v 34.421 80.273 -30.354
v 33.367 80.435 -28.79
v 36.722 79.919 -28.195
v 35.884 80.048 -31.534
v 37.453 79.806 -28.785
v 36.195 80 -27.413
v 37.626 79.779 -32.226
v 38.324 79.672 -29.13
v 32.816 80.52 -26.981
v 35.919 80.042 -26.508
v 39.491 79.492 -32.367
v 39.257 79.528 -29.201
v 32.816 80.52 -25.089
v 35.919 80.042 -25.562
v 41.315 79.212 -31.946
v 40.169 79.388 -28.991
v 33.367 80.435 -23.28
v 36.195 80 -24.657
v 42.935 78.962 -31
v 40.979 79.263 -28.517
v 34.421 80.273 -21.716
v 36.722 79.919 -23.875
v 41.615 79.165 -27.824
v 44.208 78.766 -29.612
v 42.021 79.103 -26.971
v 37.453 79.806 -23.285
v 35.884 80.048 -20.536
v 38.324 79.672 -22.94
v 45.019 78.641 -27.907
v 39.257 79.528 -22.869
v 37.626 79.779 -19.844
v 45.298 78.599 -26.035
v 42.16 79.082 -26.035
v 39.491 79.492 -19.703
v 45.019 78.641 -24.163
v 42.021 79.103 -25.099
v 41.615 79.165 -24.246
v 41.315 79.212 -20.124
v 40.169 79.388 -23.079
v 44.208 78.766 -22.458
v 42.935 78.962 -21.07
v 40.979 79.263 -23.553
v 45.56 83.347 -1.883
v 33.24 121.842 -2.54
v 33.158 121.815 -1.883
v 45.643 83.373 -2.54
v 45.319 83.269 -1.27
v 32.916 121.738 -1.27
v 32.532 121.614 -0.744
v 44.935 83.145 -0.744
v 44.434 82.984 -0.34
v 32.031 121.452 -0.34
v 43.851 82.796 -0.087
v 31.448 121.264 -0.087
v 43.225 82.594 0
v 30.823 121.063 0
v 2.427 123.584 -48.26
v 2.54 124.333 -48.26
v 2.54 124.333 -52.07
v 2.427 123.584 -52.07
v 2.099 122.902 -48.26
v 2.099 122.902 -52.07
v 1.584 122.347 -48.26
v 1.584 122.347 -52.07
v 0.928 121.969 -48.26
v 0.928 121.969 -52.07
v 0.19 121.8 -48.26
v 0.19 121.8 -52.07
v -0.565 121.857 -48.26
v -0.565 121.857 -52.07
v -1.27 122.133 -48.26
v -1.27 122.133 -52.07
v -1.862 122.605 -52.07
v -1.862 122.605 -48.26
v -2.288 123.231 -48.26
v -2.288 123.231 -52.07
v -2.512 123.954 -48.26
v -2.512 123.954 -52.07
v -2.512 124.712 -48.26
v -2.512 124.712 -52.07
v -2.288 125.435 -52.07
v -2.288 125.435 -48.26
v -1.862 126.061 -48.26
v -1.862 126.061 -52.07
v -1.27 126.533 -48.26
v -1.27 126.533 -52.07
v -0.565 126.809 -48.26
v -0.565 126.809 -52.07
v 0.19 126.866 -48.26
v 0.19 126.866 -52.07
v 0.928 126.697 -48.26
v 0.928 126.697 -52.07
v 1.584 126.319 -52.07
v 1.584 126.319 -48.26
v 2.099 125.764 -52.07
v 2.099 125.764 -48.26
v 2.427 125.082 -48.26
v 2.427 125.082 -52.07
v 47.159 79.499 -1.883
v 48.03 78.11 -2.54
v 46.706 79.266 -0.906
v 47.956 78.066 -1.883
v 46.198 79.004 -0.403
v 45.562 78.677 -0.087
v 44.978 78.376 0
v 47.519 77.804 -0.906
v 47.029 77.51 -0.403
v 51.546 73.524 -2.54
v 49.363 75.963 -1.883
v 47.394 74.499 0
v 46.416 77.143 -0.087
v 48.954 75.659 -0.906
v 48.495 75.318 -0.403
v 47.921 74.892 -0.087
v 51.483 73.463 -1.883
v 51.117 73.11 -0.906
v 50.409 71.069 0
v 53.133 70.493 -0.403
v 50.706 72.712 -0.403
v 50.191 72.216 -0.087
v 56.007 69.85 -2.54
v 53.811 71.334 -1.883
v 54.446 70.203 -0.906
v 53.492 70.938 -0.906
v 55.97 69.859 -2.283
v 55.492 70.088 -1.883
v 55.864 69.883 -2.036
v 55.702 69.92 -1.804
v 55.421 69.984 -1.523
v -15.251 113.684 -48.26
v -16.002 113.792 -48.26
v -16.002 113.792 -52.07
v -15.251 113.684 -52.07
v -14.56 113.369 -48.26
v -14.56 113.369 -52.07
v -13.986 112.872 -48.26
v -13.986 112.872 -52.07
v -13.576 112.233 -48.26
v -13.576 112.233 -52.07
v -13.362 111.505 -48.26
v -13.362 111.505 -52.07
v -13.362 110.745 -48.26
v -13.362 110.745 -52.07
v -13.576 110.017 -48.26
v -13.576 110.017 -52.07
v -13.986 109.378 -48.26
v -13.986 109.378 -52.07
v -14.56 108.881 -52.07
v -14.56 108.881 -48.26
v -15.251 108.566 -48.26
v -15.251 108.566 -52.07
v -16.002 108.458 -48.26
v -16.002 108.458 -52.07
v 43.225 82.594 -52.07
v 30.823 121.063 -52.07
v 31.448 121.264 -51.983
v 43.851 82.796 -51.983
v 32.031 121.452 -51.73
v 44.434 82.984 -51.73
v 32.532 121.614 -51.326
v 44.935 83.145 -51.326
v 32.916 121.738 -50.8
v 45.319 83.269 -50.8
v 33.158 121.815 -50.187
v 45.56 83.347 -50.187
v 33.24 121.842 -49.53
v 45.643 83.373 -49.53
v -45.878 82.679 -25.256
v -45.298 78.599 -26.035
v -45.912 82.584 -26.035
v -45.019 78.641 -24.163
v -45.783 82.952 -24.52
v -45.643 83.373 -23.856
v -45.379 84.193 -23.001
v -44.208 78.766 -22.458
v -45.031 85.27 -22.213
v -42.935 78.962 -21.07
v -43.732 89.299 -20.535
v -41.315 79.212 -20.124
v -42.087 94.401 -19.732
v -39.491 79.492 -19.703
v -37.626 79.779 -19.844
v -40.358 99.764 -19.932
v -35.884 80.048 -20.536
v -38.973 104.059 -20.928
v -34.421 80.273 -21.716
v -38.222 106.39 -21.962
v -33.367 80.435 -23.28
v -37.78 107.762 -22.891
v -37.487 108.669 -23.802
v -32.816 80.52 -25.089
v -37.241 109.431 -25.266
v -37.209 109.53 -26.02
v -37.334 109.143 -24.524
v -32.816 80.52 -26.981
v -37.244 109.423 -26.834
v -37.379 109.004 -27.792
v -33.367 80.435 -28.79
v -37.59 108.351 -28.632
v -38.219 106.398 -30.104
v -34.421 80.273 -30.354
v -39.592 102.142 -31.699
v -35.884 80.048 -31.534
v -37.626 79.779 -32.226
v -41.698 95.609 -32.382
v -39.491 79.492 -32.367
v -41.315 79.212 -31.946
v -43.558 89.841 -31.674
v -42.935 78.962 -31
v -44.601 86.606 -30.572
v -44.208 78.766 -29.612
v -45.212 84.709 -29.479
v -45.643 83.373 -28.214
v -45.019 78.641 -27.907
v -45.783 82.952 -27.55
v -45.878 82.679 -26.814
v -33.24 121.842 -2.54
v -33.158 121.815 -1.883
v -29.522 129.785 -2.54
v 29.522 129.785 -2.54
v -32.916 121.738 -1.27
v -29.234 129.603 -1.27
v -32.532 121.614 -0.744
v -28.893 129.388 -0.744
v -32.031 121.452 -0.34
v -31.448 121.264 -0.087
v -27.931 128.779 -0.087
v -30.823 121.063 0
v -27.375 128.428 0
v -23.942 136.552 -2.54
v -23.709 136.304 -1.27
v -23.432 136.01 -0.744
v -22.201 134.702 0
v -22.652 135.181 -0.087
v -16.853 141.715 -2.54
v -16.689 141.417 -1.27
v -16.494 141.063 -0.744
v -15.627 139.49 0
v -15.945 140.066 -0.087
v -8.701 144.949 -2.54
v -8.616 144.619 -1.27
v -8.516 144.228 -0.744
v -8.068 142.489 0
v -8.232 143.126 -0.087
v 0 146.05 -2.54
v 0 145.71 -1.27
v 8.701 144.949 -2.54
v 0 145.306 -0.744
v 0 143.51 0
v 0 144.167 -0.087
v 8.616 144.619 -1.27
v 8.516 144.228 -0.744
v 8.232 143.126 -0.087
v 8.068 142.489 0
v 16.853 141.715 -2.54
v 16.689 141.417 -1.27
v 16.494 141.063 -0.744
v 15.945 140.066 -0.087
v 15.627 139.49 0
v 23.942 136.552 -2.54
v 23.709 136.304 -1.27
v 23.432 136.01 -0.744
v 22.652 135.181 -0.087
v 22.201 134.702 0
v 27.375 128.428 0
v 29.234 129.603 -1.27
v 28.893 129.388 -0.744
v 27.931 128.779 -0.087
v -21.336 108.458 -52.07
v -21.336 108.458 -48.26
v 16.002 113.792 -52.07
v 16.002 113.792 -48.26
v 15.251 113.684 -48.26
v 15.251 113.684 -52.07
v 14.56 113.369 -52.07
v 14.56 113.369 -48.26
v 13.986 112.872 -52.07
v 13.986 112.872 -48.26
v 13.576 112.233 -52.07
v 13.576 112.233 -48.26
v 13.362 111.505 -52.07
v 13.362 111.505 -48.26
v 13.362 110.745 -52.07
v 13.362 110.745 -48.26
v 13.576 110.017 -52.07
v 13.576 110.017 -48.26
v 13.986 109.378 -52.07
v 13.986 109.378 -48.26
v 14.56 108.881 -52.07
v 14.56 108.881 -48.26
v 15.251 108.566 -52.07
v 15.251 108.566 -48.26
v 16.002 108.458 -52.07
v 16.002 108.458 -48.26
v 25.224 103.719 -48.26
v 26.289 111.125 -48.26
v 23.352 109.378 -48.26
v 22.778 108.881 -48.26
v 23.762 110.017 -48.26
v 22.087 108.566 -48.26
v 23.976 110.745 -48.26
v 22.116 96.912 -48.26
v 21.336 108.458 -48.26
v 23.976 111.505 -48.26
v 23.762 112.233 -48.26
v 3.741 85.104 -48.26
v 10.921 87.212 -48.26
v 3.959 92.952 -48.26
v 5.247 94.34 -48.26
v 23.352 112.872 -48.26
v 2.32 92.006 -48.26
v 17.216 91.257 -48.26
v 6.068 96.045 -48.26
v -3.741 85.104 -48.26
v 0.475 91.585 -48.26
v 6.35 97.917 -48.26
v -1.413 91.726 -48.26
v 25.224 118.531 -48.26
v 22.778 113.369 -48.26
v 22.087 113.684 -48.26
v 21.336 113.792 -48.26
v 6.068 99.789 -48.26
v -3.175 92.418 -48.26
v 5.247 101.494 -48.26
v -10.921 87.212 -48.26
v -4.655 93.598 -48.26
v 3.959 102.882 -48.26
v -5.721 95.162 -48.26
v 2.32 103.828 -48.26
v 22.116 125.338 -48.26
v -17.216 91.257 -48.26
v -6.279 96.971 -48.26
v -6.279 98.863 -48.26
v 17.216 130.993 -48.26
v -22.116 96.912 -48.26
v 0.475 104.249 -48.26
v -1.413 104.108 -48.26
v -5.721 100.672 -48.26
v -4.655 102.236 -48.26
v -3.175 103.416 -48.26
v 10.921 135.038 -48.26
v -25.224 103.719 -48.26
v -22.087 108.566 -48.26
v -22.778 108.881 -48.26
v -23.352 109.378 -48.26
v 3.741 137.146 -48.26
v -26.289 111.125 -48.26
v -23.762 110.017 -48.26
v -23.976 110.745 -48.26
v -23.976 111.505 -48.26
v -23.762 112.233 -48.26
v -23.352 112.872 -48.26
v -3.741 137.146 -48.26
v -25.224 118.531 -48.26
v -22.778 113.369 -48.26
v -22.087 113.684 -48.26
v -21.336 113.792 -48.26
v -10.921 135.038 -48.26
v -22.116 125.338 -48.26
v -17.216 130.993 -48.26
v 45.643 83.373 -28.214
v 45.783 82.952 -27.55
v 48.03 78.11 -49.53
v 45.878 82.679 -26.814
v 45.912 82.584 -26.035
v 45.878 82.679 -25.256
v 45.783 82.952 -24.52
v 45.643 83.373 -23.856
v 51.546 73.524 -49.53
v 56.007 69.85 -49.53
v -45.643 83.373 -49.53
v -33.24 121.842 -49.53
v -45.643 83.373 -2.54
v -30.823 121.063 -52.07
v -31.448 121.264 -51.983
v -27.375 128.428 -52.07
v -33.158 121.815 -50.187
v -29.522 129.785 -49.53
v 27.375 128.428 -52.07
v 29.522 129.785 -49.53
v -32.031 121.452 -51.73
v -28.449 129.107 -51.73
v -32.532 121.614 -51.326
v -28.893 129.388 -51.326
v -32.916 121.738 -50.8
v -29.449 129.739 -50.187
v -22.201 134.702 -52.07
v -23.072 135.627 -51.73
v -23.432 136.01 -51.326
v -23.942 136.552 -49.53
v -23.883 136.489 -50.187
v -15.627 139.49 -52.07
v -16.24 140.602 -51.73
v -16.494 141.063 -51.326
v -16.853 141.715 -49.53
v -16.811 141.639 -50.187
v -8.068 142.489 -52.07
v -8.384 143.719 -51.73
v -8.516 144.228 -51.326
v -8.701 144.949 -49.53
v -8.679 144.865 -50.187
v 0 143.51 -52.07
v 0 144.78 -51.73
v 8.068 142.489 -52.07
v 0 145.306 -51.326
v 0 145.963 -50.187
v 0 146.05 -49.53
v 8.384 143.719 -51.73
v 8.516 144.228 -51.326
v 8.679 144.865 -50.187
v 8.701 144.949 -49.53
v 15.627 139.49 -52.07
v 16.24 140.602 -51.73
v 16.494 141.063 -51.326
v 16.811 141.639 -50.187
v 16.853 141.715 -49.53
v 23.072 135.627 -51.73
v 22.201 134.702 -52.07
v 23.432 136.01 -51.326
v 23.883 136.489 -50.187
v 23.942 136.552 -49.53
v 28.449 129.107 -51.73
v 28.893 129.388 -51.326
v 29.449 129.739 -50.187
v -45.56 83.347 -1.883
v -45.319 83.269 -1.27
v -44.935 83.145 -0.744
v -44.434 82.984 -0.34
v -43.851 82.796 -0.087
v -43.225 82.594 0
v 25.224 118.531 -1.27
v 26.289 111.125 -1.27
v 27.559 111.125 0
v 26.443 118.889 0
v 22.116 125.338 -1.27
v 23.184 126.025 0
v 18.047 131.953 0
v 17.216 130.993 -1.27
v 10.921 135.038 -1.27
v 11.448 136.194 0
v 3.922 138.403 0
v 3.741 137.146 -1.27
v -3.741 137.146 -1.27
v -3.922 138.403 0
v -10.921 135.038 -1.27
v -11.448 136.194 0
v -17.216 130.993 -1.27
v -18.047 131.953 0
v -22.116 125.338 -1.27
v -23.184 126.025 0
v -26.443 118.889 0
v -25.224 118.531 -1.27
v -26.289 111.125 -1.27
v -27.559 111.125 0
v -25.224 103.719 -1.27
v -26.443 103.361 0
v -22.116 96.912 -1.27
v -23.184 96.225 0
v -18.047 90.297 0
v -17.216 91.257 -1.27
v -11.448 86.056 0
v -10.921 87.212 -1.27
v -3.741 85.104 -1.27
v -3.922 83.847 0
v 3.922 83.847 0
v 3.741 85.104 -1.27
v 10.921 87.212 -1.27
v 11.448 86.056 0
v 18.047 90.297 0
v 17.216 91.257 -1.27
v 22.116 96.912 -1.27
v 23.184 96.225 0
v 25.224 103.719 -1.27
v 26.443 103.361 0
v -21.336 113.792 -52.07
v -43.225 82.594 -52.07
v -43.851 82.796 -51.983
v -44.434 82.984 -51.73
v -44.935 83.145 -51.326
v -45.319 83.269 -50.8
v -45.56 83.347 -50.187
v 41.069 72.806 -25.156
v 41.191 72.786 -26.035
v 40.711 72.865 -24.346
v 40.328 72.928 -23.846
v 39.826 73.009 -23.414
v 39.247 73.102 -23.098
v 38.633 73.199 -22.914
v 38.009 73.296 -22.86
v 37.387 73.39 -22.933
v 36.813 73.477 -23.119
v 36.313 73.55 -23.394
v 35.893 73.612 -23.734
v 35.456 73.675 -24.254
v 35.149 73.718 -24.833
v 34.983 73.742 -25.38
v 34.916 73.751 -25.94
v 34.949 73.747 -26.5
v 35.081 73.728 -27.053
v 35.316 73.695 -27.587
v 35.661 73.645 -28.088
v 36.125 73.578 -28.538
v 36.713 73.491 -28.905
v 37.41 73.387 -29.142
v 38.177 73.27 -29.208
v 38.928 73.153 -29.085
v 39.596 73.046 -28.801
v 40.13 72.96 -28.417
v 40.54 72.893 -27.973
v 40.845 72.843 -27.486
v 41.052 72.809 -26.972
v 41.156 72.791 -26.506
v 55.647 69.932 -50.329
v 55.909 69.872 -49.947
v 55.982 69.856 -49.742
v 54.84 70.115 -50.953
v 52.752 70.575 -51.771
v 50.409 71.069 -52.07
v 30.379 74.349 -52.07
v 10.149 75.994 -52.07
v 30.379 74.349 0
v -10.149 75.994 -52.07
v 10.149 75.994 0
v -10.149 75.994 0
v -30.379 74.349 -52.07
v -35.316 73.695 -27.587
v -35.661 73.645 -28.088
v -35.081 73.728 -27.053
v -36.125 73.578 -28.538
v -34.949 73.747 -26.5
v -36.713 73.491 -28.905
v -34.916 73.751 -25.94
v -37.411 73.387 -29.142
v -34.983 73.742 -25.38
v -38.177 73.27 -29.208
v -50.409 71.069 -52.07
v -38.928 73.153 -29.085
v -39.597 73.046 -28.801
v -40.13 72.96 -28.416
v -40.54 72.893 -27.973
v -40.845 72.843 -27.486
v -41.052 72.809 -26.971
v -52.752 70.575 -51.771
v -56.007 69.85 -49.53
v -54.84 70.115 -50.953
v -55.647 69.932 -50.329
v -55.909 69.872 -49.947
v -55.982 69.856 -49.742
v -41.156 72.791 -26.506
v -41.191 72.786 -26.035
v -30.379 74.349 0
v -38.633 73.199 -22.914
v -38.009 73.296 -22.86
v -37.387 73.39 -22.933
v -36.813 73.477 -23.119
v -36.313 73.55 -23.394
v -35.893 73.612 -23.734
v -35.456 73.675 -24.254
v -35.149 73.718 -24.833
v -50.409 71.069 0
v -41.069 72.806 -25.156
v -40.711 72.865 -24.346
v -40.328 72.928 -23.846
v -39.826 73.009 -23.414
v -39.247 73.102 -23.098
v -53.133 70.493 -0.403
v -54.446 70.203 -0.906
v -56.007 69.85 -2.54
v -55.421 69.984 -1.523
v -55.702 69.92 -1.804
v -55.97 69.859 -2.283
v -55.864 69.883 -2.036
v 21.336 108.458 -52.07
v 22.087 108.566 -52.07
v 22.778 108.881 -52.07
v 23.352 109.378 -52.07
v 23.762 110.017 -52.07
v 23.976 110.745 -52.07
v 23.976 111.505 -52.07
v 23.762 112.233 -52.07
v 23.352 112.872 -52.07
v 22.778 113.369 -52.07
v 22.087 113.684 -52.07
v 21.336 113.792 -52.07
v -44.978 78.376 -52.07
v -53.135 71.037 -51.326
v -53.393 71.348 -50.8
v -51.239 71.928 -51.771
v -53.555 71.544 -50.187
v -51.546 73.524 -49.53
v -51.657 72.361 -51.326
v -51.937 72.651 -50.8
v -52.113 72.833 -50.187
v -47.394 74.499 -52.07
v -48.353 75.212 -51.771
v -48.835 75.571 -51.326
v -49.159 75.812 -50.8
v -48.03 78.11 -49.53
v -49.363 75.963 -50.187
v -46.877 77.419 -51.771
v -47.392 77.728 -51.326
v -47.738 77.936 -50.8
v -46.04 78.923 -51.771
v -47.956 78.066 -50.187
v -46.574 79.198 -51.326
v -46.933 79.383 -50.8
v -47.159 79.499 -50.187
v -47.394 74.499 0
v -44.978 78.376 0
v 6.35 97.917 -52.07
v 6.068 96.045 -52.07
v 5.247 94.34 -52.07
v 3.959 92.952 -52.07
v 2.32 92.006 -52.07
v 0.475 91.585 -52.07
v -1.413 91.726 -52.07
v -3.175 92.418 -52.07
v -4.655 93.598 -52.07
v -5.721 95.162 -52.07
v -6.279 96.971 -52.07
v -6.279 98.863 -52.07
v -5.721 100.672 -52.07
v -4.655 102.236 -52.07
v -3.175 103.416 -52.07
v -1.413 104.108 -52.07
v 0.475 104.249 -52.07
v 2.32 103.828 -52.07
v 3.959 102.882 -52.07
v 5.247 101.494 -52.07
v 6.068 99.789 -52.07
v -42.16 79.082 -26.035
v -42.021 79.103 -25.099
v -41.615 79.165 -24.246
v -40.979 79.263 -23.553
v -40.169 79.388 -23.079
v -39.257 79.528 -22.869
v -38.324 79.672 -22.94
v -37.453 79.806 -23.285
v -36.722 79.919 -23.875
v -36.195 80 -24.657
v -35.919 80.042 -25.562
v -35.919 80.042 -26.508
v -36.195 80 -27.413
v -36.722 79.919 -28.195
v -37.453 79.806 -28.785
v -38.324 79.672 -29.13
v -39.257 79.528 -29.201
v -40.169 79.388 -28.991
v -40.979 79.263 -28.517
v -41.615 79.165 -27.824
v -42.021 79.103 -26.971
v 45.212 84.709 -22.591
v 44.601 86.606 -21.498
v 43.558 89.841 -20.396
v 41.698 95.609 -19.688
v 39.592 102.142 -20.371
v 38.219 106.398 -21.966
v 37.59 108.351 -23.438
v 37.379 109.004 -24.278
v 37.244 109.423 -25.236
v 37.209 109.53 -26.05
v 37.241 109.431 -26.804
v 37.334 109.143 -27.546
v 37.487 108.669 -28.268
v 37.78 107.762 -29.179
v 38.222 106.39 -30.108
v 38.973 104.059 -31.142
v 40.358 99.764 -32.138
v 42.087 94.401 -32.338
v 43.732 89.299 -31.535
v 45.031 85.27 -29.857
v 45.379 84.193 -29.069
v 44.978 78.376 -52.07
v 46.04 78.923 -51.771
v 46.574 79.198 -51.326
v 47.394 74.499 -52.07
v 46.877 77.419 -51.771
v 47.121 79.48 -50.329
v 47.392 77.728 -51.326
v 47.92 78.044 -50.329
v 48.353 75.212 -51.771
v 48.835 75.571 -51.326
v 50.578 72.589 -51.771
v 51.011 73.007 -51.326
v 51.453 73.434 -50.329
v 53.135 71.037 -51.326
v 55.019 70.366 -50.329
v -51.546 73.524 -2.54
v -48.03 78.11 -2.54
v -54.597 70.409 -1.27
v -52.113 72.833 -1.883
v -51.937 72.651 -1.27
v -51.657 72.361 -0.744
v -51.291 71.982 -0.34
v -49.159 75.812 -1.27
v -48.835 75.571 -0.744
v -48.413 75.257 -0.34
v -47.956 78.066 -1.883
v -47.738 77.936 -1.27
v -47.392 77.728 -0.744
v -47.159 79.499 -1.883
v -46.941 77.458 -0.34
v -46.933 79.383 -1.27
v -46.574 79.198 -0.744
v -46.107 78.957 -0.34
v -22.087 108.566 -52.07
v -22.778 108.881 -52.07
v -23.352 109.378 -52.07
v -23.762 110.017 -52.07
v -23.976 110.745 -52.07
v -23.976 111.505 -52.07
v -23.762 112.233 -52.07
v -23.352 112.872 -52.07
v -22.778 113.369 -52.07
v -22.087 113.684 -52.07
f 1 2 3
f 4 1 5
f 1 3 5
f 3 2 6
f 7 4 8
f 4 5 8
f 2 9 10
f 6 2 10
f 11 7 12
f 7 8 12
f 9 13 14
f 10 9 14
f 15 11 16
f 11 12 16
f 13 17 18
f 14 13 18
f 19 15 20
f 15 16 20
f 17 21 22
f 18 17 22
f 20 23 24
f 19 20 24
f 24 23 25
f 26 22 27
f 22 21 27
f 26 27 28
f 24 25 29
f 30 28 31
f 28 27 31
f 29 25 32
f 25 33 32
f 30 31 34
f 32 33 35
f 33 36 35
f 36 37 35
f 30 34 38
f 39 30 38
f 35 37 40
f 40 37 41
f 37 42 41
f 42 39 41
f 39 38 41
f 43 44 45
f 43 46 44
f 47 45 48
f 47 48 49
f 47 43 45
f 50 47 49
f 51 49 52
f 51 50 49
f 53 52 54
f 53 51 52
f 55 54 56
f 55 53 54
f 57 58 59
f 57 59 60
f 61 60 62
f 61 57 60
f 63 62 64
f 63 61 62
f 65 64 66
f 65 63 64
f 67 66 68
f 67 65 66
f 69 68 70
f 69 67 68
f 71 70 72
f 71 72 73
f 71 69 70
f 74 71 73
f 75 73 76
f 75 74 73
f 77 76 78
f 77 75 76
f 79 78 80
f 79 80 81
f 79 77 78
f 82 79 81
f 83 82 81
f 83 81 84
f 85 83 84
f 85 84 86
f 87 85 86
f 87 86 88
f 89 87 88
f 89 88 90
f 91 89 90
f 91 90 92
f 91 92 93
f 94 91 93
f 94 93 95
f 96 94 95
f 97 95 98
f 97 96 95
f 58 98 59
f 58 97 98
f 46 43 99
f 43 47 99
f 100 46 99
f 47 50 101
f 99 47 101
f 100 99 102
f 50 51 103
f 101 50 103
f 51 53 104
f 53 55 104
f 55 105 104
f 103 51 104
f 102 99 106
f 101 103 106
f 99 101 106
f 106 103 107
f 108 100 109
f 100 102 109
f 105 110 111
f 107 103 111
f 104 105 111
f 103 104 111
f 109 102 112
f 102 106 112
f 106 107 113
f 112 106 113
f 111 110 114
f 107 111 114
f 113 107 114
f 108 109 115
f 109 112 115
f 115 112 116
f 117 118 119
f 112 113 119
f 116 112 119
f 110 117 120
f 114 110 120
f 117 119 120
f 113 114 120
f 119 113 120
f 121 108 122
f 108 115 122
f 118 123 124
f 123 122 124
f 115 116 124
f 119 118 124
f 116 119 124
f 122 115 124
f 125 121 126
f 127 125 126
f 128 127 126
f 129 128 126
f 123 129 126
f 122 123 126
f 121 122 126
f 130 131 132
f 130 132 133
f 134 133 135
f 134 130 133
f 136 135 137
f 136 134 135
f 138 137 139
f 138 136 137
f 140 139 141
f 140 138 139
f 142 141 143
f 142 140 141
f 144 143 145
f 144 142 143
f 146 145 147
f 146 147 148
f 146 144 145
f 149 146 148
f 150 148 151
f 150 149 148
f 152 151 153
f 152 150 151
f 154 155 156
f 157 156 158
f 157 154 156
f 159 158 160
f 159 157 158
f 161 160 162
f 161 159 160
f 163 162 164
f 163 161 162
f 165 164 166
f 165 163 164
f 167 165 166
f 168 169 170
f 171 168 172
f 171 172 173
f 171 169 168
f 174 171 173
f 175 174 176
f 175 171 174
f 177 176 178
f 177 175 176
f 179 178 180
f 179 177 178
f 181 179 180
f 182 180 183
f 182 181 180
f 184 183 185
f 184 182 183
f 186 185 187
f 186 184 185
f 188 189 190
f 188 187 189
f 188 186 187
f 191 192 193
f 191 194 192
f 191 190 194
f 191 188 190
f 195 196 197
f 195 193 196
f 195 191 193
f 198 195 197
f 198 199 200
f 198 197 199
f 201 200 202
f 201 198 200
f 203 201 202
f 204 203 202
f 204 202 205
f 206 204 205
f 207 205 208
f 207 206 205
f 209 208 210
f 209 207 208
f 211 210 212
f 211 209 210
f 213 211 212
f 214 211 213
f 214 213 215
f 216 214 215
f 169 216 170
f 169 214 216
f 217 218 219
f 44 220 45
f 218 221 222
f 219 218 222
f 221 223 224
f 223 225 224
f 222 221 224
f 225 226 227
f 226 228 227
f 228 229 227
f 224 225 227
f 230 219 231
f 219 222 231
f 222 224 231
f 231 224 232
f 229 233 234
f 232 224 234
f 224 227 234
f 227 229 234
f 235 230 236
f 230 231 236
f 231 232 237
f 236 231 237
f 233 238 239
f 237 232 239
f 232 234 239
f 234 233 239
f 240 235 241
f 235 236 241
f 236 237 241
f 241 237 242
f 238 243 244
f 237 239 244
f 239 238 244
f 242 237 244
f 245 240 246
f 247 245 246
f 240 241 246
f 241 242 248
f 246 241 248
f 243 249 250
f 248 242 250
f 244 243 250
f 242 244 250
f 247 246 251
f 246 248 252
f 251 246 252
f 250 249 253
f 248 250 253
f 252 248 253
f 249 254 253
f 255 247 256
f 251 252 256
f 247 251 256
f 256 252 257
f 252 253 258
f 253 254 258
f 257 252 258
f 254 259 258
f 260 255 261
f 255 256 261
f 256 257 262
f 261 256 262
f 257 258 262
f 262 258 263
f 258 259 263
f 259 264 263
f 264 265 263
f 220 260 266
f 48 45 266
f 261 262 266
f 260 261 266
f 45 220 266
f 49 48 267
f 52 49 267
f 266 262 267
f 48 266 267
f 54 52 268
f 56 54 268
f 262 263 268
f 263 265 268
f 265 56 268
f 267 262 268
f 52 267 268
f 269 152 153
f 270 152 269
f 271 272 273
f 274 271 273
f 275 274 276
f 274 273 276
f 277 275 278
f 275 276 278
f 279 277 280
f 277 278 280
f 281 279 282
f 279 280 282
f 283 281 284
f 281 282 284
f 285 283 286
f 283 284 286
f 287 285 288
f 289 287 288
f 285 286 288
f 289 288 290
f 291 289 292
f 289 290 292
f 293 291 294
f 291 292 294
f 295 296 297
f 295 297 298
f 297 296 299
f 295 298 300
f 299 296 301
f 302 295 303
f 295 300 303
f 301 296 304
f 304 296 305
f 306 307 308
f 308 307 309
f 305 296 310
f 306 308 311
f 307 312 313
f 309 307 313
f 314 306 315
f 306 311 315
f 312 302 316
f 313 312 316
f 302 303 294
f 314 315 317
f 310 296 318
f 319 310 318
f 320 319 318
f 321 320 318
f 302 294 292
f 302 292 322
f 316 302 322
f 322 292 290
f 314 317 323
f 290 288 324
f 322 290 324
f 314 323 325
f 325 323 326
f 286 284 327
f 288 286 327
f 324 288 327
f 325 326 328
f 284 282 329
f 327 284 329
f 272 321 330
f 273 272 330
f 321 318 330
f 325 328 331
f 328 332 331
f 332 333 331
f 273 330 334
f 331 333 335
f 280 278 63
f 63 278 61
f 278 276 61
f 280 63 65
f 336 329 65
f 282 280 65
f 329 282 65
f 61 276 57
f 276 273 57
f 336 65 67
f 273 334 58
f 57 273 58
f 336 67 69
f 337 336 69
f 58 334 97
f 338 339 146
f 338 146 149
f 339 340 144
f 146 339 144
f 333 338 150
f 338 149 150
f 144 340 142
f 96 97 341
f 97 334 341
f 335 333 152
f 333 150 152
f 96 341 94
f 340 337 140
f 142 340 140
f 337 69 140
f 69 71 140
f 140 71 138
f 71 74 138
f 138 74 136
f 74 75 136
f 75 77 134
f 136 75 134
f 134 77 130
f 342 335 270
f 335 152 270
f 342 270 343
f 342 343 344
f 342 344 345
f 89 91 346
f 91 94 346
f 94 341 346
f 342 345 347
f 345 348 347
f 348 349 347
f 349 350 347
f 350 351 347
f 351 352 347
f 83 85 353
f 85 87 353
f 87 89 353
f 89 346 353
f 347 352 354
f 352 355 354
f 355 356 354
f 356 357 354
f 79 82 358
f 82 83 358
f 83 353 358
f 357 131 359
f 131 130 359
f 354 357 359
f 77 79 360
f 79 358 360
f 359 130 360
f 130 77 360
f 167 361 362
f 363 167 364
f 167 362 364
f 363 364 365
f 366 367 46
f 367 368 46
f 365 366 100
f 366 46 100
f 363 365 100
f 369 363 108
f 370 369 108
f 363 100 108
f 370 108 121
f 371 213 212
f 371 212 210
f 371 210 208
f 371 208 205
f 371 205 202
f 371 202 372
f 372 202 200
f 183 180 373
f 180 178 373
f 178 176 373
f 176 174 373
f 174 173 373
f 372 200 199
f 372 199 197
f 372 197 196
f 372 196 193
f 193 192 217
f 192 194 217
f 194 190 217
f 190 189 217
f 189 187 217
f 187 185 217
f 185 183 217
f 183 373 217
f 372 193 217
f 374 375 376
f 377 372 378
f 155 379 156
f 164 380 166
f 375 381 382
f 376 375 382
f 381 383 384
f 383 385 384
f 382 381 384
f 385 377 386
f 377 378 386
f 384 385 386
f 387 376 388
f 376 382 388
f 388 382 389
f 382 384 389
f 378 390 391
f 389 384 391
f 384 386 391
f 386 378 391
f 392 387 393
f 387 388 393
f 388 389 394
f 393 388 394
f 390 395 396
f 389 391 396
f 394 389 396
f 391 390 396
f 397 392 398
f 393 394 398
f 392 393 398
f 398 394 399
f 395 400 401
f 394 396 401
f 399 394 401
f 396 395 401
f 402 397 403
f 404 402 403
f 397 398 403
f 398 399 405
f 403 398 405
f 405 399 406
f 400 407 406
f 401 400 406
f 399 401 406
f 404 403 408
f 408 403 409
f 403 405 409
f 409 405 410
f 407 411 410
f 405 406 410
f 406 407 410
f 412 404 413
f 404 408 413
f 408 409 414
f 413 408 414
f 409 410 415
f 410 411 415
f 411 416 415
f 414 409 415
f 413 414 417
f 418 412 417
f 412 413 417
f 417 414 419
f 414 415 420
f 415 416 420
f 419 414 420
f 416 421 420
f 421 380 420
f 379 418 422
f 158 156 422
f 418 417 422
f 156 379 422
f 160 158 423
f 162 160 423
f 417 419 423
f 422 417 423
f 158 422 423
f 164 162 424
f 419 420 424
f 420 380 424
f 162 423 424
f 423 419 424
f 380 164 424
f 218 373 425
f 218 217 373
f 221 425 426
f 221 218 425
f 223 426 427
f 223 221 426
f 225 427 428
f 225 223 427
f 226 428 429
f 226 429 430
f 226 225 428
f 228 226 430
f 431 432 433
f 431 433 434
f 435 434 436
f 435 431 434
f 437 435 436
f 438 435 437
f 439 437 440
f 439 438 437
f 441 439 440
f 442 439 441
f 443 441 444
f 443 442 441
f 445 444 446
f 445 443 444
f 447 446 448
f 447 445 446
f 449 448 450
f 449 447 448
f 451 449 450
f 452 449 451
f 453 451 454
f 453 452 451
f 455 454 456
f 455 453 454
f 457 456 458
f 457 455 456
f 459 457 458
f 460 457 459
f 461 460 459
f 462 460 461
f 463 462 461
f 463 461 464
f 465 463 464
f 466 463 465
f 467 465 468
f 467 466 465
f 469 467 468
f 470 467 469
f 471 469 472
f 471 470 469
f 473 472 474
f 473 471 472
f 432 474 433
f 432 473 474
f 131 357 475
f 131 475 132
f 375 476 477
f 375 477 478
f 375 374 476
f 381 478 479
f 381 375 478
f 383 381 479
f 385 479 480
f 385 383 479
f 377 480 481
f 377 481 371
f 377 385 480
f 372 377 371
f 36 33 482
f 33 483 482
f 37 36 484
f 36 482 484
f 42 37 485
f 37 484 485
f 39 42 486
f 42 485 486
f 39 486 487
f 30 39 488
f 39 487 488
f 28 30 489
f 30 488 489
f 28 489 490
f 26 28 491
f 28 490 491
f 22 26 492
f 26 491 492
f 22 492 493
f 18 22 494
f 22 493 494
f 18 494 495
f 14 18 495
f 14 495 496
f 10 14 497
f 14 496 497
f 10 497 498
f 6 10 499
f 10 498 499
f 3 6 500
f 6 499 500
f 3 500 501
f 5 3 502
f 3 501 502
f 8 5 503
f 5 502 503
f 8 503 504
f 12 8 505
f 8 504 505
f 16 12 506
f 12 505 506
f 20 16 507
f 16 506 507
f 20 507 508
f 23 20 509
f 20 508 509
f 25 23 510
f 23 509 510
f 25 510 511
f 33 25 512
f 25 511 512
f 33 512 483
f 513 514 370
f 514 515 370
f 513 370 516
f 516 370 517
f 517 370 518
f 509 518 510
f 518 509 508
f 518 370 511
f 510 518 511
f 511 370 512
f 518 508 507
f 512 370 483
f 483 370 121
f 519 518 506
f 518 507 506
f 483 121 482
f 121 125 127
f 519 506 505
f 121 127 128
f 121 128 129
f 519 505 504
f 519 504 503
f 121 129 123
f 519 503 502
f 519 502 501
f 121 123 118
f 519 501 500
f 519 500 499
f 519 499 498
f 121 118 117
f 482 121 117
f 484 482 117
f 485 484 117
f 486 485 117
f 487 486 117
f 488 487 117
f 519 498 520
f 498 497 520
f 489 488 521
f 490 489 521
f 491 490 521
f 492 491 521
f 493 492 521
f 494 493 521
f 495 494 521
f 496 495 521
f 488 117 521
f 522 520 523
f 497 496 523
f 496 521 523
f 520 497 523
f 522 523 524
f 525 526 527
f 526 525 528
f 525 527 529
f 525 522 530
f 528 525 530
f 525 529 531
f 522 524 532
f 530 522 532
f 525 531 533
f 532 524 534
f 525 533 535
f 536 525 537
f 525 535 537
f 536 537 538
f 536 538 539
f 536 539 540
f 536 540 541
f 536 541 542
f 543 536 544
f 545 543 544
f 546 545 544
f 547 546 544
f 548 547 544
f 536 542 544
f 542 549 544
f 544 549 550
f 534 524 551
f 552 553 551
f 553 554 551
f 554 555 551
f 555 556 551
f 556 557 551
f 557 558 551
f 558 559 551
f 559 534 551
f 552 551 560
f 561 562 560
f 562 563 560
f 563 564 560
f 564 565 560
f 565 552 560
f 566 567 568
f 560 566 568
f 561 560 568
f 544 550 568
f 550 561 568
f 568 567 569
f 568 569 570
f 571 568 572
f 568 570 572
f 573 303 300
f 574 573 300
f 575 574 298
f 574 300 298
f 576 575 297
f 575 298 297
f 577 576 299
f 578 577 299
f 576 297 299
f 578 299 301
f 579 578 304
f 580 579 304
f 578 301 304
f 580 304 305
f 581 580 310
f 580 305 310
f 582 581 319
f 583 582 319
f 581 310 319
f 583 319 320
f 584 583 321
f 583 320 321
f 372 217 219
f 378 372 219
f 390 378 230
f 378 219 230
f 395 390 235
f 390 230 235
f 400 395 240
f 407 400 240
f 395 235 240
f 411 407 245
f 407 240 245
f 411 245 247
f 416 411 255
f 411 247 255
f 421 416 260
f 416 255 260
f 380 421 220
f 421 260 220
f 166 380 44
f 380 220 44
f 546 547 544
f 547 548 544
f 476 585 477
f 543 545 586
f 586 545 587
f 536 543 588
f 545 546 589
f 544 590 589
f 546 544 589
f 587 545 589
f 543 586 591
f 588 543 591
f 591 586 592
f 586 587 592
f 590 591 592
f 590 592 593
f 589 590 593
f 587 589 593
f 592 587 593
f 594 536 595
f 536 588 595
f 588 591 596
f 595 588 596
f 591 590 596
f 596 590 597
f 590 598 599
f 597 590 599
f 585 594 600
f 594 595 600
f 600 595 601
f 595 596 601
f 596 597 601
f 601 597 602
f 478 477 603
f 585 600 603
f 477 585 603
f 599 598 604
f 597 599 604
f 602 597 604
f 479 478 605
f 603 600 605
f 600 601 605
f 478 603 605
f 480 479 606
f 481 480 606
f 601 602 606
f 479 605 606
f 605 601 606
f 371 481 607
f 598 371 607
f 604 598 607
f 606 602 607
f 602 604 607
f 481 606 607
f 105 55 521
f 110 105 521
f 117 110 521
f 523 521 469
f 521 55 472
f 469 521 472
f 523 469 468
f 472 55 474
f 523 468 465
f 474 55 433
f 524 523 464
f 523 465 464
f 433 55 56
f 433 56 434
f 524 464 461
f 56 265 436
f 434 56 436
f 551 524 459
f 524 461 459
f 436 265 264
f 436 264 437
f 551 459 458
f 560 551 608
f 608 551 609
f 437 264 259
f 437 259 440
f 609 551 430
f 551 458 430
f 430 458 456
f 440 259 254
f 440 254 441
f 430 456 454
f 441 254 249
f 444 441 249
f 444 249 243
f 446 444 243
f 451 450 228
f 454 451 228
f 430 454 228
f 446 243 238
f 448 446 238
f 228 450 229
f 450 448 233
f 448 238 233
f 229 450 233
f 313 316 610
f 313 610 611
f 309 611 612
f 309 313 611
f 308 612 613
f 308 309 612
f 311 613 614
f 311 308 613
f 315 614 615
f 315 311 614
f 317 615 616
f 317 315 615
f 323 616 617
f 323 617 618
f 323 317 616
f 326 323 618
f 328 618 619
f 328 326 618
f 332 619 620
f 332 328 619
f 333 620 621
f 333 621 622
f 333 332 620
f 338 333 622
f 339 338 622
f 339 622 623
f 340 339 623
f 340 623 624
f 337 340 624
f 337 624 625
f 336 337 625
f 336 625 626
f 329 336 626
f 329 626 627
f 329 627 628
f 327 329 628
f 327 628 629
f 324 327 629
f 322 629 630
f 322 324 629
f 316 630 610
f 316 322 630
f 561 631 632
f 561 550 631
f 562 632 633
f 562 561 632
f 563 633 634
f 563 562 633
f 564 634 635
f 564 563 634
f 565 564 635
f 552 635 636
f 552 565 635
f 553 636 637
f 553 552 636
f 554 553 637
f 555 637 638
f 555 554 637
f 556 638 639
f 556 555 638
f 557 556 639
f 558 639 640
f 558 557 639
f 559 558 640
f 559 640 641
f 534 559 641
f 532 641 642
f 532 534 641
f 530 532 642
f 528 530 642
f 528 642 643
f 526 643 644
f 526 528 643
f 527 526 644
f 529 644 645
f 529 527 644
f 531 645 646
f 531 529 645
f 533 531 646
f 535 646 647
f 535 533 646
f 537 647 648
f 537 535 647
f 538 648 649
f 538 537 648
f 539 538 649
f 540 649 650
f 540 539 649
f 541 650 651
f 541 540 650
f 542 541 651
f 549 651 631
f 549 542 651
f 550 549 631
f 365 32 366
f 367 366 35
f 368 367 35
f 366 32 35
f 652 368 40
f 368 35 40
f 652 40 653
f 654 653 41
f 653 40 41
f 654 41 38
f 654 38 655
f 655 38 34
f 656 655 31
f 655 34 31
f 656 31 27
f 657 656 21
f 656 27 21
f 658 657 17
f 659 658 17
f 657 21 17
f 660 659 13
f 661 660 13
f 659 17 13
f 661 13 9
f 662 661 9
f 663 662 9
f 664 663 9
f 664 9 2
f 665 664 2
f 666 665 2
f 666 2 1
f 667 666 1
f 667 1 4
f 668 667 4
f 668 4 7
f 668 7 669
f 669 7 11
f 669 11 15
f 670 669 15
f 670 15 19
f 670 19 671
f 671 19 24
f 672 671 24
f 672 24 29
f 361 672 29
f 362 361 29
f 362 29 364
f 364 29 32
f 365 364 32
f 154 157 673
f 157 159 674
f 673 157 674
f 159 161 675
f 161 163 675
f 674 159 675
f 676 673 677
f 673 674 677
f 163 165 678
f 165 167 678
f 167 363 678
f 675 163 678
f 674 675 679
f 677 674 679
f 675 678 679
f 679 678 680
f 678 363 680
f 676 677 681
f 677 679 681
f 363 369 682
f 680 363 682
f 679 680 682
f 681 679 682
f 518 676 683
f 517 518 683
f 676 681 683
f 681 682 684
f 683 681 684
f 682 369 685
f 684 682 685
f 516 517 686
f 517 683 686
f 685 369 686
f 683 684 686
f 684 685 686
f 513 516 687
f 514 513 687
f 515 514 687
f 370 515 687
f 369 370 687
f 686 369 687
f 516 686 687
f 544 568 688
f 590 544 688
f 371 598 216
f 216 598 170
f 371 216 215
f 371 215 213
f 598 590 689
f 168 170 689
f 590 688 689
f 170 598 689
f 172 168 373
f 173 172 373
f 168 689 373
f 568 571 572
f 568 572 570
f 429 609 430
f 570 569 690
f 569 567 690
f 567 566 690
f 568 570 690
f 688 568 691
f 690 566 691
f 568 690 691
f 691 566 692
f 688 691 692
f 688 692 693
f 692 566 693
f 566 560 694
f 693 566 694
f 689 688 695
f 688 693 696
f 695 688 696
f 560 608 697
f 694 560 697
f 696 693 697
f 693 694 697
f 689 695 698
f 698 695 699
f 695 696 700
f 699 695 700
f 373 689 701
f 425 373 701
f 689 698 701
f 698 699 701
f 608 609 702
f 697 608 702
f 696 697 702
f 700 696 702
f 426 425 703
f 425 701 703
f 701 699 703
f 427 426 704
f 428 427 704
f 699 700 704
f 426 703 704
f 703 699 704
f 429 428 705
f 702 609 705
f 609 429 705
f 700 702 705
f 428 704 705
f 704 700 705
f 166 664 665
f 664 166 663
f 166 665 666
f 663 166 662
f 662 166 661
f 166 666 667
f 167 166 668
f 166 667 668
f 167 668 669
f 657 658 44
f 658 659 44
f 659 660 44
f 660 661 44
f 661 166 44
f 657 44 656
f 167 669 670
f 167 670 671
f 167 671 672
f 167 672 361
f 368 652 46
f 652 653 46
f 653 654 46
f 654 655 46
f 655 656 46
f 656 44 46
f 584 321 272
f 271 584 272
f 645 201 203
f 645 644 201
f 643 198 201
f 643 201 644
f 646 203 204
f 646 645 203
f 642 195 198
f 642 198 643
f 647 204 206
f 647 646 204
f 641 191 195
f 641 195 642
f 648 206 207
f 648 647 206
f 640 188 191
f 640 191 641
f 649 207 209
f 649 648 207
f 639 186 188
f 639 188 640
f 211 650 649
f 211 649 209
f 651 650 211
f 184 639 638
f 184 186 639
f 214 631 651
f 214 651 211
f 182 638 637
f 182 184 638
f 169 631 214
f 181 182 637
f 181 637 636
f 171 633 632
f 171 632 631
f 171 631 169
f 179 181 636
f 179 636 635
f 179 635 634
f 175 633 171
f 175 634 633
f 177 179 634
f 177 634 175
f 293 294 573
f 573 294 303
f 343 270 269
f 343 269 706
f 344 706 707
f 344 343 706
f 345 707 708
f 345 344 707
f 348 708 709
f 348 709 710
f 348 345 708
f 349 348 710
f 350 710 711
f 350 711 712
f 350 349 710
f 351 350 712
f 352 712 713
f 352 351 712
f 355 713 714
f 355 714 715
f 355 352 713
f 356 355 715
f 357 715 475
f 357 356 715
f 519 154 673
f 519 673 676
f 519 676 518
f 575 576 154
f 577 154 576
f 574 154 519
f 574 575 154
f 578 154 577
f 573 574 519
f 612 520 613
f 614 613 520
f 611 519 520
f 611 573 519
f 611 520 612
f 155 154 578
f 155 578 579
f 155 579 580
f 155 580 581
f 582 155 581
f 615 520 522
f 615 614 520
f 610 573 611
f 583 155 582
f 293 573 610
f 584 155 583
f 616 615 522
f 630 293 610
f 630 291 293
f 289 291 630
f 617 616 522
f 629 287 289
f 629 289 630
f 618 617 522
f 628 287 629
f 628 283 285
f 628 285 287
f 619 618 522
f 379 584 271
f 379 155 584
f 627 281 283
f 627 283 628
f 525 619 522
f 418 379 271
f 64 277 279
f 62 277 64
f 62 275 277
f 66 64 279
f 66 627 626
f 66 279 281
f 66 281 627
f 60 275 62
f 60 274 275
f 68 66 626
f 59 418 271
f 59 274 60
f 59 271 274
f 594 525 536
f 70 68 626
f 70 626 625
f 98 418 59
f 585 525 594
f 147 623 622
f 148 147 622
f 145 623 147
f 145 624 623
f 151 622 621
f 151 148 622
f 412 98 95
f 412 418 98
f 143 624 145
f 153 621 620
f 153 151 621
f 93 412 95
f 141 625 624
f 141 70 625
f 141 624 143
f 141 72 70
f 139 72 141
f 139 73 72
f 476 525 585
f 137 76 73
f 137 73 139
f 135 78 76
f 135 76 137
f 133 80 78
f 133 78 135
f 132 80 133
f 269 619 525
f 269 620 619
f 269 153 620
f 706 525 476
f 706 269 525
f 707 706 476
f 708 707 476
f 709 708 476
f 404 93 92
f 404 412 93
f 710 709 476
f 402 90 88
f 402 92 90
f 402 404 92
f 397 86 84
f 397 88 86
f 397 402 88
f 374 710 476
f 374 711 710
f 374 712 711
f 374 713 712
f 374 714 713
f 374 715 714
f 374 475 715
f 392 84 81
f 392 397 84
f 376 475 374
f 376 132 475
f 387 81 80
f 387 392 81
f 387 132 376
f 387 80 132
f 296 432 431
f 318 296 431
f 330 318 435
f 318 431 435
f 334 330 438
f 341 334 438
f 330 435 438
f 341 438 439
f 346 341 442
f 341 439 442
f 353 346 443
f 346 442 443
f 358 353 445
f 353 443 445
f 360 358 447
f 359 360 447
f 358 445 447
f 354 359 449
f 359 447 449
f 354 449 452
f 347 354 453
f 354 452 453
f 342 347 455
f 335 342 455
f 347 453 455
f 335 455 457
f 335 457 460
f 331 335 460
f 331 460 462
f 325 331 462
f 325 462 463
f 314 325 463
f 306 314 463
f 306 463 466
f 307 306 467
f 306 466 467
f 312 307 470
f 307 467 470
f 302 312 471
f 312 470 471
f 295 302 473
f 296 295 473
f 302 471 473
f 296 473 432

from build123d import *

# Parameters (mm, degrees)
SKETCH1_R           = 26.289
BOSS_EXTRUDE1_DEPTH = 48.26
FILLET1_R           = 2.54
CHAMFER1_SIZE       = 1.27
SKETCH2_R           = 6.35
SKETCH2_R_2         = 2.54
BOSS_EXTRUDE2_DEPTH = 3.81
FILLET2_R           = 2.54
SKETCH4_R           = 3.175
CUT_EXTRUDE1_DEPTH  = 110.759820078
CUT_EXTRUDE2_START  = -6.35
SKETCH5_R           = 6.35
CUT_EXTRUDE2_DEPTH  = 104.409820078


with BuildPart() as part:
    # Sketch1 → Boss-Extrude1 (new body)
    with BuildSketch(Plane.XY):
        with BuildLine():
            Line((-45.642801894, 83.373274477), (-33.240070063, 121.841966324))
            ThreePointArc((-33.240070063, 121.841966324), (0, 146.05), (33.240070063, 121.841966324))
            Line((33.240070063, 121.841966324), (45.642801894, 83.373274477))
            ThreePointArc((45.642801894, 83.373274477), (49.65717276, 75.716693762), (56.007, 69.85))
            ThreePointArc((56.007, 69.85), (0, 76.2), (-56.007, 69.85))
            ThreePointArc((-56.007, 69.85), (-49.65717276, 75.716693762), (-45.642801894, 83.373274477))
        make_face()
        with Locations((0, 111.125)):
            Circle(SKETCH1_R, mode=Mode.SUBTRACT)
    extrude(amount=-BOSS_EXTRUDE1_DEPTH)

    # Fillet1
    fillet1_edges = [part.edges().sort_by_distance(p)[0] for p in [
        (-49.65717276, 75.716693762, 0),
        (-39.441435979, 102.6076204, 0),
        (0, 146.05, 0),
        (39.441435979, 102.6076204, 0),
        (49.65717276, 75.716693762, 0),
    ]]
    fillet(fillet1_edges, radius=FILLET1_R)

    # Chamfer1
    chamfer1_edges = [part.edges().sort_by_distance(p)[0] for p in [
        (-26.289, 111.125, 0),
    ]]
    chamfer(chamfer1_edges, length=CHAMFER1_SIZE)

    # Sketch2 → Boss-Extrude2 (add)
    with BuildSketch(Plane(origin=(0, 0, -48.26), x_dir=(-1, 0, 0), z_dir=(0, 0, -1))):
        with BuildLine():
            Line((45.642801894, 83.373274477), (33.240070063, 121.841966324))
            ThreePointArc((33.240070063, 121.841966324), (0, 146.05), (-33.240070063, 121.841966324))
            Line((-33.240070063, 121.841966324), (-45.642801894, 83.373274477))
            ThreePointArc((-45.642801894, 83.373274477), (-49.65717276, 75.716693762), (-56.007, 69.85))
            ThreePointArc((-56.007, 69.85), (0, 76.2), (56.007, 69.85))
            ThreePointArc((56.007, 69.85), (49.65717276, 75.716693762), (45.642801894, 83.373274477))
        make_face()
        with Locations(Location((0, 97.917, 0), (0, 0, 180))):
            Circle(SKETCH2_R, mode=Mode.SUBTRACT)
        with Locations(Location((0, 124.333, 0), (0, 0, 180))):
            Circle(SKETCH2_R_2, mode=Mode.SUBTRACT)
        with BuildLine():
            Line((-21.336, 113.792), (-16.002, 113.792))
            ThreePointArc((-16.002, 113.792), (-13.335, 111.125), (-16.002, 108.458))
            Line((-16.002, 108.458), (-21.336, 108.458))
            ThreePointArc((-21.336, 108.458), (-24.003, 111.125), (-21.336, 113.792))
        make_face(mode=Mode.SUBTRACT)
        with BuildLine():
            Line((21.336, 113.792), (16.002, 113.792))
            ThreePointArc((16.002, 113.792), (13.335, 111.125), (16.002, 108.458))
            Line((16.002, 108.458), (21.336, 108.458))
            ThreePointArc((21.336, 108.458), (24.003, 111.125), (21.336, 113.792))
        make_face(mode=Mode.SUBTRACT)
    extrude(amount=BOSS_EXTRUDE2_DEPTH)

    # Fillet2
    fillet2_edges = [part.edges().sort_by_distance(p)[0] for p in [
        (-49.65717276, 75.716693762, -52.07),
        (-39.441435979, 102.6076204, -52.07),
        (0, 146.05, -52.07),
        (39.441435979, 102.6076204, -52.07),
        (49.65717276, 75.716693762, -52.07),
    ]]
    fillet(fillet2_edges, radius=FILLET2_R)

    # Sketch4 → Cut-Extrude1 (cut, symmetric)
    with BuildSketch(Plane(origin=(11.899806241, 77.314282605, 0), x_dir=(-0.9883615104677608, 0.15212338618991694, 0), z_dir=(-0.15212338618991694, -0.9883615104677608, 0))):
        with Locations(Location((-26.464277226, 26.035, 0), (0, 0, 180))):
            Circle(SKETCH4_R)
    cut_extrude1 = extrude(amount=CUT_EXTRUDE1_DEPTH, both=True, mode=Mode.SUBTRACT)

    # Sketch5 → Cut-Extrude2 (cut, through all)
    with BuildSketch(Plane(origin=(11.899806241, 77.314282605, 0), x_dir=(-0.9883615104677608, 0.15212338618991694, 0), z_dir=(-0.15212338618991694, -0.9883615104677608, 0)).offset(CUT_EXTRUDE2_START)):
        with Locations(Location((-26.464277226, 26.035, 0), (0, 0, 180))):
            Circle(SKETCH5_R)
    cut_extrude2 = extrude(amount=-CUT_EXTRUDE2_DEPTH, mode=Mode.SUBTRACT)

    # Mirror1: Cut-Extrude1, Cut-Extrude2 across plane
    add(cut_extrude1.mirror(Plane(origin=(0, 0, 0), x_dir=(0, 0, 1), z_dir=(1, 0, 0))), mode=Mode.SUBTRACT)
    add(cut_extrude2.mirror(Plane(origin=(0, 0, 0), x_dir=(0, 0, 1), z_dir=(1, 0, 0))), mode=Mode.SUBTRACT)


solid = part.part
